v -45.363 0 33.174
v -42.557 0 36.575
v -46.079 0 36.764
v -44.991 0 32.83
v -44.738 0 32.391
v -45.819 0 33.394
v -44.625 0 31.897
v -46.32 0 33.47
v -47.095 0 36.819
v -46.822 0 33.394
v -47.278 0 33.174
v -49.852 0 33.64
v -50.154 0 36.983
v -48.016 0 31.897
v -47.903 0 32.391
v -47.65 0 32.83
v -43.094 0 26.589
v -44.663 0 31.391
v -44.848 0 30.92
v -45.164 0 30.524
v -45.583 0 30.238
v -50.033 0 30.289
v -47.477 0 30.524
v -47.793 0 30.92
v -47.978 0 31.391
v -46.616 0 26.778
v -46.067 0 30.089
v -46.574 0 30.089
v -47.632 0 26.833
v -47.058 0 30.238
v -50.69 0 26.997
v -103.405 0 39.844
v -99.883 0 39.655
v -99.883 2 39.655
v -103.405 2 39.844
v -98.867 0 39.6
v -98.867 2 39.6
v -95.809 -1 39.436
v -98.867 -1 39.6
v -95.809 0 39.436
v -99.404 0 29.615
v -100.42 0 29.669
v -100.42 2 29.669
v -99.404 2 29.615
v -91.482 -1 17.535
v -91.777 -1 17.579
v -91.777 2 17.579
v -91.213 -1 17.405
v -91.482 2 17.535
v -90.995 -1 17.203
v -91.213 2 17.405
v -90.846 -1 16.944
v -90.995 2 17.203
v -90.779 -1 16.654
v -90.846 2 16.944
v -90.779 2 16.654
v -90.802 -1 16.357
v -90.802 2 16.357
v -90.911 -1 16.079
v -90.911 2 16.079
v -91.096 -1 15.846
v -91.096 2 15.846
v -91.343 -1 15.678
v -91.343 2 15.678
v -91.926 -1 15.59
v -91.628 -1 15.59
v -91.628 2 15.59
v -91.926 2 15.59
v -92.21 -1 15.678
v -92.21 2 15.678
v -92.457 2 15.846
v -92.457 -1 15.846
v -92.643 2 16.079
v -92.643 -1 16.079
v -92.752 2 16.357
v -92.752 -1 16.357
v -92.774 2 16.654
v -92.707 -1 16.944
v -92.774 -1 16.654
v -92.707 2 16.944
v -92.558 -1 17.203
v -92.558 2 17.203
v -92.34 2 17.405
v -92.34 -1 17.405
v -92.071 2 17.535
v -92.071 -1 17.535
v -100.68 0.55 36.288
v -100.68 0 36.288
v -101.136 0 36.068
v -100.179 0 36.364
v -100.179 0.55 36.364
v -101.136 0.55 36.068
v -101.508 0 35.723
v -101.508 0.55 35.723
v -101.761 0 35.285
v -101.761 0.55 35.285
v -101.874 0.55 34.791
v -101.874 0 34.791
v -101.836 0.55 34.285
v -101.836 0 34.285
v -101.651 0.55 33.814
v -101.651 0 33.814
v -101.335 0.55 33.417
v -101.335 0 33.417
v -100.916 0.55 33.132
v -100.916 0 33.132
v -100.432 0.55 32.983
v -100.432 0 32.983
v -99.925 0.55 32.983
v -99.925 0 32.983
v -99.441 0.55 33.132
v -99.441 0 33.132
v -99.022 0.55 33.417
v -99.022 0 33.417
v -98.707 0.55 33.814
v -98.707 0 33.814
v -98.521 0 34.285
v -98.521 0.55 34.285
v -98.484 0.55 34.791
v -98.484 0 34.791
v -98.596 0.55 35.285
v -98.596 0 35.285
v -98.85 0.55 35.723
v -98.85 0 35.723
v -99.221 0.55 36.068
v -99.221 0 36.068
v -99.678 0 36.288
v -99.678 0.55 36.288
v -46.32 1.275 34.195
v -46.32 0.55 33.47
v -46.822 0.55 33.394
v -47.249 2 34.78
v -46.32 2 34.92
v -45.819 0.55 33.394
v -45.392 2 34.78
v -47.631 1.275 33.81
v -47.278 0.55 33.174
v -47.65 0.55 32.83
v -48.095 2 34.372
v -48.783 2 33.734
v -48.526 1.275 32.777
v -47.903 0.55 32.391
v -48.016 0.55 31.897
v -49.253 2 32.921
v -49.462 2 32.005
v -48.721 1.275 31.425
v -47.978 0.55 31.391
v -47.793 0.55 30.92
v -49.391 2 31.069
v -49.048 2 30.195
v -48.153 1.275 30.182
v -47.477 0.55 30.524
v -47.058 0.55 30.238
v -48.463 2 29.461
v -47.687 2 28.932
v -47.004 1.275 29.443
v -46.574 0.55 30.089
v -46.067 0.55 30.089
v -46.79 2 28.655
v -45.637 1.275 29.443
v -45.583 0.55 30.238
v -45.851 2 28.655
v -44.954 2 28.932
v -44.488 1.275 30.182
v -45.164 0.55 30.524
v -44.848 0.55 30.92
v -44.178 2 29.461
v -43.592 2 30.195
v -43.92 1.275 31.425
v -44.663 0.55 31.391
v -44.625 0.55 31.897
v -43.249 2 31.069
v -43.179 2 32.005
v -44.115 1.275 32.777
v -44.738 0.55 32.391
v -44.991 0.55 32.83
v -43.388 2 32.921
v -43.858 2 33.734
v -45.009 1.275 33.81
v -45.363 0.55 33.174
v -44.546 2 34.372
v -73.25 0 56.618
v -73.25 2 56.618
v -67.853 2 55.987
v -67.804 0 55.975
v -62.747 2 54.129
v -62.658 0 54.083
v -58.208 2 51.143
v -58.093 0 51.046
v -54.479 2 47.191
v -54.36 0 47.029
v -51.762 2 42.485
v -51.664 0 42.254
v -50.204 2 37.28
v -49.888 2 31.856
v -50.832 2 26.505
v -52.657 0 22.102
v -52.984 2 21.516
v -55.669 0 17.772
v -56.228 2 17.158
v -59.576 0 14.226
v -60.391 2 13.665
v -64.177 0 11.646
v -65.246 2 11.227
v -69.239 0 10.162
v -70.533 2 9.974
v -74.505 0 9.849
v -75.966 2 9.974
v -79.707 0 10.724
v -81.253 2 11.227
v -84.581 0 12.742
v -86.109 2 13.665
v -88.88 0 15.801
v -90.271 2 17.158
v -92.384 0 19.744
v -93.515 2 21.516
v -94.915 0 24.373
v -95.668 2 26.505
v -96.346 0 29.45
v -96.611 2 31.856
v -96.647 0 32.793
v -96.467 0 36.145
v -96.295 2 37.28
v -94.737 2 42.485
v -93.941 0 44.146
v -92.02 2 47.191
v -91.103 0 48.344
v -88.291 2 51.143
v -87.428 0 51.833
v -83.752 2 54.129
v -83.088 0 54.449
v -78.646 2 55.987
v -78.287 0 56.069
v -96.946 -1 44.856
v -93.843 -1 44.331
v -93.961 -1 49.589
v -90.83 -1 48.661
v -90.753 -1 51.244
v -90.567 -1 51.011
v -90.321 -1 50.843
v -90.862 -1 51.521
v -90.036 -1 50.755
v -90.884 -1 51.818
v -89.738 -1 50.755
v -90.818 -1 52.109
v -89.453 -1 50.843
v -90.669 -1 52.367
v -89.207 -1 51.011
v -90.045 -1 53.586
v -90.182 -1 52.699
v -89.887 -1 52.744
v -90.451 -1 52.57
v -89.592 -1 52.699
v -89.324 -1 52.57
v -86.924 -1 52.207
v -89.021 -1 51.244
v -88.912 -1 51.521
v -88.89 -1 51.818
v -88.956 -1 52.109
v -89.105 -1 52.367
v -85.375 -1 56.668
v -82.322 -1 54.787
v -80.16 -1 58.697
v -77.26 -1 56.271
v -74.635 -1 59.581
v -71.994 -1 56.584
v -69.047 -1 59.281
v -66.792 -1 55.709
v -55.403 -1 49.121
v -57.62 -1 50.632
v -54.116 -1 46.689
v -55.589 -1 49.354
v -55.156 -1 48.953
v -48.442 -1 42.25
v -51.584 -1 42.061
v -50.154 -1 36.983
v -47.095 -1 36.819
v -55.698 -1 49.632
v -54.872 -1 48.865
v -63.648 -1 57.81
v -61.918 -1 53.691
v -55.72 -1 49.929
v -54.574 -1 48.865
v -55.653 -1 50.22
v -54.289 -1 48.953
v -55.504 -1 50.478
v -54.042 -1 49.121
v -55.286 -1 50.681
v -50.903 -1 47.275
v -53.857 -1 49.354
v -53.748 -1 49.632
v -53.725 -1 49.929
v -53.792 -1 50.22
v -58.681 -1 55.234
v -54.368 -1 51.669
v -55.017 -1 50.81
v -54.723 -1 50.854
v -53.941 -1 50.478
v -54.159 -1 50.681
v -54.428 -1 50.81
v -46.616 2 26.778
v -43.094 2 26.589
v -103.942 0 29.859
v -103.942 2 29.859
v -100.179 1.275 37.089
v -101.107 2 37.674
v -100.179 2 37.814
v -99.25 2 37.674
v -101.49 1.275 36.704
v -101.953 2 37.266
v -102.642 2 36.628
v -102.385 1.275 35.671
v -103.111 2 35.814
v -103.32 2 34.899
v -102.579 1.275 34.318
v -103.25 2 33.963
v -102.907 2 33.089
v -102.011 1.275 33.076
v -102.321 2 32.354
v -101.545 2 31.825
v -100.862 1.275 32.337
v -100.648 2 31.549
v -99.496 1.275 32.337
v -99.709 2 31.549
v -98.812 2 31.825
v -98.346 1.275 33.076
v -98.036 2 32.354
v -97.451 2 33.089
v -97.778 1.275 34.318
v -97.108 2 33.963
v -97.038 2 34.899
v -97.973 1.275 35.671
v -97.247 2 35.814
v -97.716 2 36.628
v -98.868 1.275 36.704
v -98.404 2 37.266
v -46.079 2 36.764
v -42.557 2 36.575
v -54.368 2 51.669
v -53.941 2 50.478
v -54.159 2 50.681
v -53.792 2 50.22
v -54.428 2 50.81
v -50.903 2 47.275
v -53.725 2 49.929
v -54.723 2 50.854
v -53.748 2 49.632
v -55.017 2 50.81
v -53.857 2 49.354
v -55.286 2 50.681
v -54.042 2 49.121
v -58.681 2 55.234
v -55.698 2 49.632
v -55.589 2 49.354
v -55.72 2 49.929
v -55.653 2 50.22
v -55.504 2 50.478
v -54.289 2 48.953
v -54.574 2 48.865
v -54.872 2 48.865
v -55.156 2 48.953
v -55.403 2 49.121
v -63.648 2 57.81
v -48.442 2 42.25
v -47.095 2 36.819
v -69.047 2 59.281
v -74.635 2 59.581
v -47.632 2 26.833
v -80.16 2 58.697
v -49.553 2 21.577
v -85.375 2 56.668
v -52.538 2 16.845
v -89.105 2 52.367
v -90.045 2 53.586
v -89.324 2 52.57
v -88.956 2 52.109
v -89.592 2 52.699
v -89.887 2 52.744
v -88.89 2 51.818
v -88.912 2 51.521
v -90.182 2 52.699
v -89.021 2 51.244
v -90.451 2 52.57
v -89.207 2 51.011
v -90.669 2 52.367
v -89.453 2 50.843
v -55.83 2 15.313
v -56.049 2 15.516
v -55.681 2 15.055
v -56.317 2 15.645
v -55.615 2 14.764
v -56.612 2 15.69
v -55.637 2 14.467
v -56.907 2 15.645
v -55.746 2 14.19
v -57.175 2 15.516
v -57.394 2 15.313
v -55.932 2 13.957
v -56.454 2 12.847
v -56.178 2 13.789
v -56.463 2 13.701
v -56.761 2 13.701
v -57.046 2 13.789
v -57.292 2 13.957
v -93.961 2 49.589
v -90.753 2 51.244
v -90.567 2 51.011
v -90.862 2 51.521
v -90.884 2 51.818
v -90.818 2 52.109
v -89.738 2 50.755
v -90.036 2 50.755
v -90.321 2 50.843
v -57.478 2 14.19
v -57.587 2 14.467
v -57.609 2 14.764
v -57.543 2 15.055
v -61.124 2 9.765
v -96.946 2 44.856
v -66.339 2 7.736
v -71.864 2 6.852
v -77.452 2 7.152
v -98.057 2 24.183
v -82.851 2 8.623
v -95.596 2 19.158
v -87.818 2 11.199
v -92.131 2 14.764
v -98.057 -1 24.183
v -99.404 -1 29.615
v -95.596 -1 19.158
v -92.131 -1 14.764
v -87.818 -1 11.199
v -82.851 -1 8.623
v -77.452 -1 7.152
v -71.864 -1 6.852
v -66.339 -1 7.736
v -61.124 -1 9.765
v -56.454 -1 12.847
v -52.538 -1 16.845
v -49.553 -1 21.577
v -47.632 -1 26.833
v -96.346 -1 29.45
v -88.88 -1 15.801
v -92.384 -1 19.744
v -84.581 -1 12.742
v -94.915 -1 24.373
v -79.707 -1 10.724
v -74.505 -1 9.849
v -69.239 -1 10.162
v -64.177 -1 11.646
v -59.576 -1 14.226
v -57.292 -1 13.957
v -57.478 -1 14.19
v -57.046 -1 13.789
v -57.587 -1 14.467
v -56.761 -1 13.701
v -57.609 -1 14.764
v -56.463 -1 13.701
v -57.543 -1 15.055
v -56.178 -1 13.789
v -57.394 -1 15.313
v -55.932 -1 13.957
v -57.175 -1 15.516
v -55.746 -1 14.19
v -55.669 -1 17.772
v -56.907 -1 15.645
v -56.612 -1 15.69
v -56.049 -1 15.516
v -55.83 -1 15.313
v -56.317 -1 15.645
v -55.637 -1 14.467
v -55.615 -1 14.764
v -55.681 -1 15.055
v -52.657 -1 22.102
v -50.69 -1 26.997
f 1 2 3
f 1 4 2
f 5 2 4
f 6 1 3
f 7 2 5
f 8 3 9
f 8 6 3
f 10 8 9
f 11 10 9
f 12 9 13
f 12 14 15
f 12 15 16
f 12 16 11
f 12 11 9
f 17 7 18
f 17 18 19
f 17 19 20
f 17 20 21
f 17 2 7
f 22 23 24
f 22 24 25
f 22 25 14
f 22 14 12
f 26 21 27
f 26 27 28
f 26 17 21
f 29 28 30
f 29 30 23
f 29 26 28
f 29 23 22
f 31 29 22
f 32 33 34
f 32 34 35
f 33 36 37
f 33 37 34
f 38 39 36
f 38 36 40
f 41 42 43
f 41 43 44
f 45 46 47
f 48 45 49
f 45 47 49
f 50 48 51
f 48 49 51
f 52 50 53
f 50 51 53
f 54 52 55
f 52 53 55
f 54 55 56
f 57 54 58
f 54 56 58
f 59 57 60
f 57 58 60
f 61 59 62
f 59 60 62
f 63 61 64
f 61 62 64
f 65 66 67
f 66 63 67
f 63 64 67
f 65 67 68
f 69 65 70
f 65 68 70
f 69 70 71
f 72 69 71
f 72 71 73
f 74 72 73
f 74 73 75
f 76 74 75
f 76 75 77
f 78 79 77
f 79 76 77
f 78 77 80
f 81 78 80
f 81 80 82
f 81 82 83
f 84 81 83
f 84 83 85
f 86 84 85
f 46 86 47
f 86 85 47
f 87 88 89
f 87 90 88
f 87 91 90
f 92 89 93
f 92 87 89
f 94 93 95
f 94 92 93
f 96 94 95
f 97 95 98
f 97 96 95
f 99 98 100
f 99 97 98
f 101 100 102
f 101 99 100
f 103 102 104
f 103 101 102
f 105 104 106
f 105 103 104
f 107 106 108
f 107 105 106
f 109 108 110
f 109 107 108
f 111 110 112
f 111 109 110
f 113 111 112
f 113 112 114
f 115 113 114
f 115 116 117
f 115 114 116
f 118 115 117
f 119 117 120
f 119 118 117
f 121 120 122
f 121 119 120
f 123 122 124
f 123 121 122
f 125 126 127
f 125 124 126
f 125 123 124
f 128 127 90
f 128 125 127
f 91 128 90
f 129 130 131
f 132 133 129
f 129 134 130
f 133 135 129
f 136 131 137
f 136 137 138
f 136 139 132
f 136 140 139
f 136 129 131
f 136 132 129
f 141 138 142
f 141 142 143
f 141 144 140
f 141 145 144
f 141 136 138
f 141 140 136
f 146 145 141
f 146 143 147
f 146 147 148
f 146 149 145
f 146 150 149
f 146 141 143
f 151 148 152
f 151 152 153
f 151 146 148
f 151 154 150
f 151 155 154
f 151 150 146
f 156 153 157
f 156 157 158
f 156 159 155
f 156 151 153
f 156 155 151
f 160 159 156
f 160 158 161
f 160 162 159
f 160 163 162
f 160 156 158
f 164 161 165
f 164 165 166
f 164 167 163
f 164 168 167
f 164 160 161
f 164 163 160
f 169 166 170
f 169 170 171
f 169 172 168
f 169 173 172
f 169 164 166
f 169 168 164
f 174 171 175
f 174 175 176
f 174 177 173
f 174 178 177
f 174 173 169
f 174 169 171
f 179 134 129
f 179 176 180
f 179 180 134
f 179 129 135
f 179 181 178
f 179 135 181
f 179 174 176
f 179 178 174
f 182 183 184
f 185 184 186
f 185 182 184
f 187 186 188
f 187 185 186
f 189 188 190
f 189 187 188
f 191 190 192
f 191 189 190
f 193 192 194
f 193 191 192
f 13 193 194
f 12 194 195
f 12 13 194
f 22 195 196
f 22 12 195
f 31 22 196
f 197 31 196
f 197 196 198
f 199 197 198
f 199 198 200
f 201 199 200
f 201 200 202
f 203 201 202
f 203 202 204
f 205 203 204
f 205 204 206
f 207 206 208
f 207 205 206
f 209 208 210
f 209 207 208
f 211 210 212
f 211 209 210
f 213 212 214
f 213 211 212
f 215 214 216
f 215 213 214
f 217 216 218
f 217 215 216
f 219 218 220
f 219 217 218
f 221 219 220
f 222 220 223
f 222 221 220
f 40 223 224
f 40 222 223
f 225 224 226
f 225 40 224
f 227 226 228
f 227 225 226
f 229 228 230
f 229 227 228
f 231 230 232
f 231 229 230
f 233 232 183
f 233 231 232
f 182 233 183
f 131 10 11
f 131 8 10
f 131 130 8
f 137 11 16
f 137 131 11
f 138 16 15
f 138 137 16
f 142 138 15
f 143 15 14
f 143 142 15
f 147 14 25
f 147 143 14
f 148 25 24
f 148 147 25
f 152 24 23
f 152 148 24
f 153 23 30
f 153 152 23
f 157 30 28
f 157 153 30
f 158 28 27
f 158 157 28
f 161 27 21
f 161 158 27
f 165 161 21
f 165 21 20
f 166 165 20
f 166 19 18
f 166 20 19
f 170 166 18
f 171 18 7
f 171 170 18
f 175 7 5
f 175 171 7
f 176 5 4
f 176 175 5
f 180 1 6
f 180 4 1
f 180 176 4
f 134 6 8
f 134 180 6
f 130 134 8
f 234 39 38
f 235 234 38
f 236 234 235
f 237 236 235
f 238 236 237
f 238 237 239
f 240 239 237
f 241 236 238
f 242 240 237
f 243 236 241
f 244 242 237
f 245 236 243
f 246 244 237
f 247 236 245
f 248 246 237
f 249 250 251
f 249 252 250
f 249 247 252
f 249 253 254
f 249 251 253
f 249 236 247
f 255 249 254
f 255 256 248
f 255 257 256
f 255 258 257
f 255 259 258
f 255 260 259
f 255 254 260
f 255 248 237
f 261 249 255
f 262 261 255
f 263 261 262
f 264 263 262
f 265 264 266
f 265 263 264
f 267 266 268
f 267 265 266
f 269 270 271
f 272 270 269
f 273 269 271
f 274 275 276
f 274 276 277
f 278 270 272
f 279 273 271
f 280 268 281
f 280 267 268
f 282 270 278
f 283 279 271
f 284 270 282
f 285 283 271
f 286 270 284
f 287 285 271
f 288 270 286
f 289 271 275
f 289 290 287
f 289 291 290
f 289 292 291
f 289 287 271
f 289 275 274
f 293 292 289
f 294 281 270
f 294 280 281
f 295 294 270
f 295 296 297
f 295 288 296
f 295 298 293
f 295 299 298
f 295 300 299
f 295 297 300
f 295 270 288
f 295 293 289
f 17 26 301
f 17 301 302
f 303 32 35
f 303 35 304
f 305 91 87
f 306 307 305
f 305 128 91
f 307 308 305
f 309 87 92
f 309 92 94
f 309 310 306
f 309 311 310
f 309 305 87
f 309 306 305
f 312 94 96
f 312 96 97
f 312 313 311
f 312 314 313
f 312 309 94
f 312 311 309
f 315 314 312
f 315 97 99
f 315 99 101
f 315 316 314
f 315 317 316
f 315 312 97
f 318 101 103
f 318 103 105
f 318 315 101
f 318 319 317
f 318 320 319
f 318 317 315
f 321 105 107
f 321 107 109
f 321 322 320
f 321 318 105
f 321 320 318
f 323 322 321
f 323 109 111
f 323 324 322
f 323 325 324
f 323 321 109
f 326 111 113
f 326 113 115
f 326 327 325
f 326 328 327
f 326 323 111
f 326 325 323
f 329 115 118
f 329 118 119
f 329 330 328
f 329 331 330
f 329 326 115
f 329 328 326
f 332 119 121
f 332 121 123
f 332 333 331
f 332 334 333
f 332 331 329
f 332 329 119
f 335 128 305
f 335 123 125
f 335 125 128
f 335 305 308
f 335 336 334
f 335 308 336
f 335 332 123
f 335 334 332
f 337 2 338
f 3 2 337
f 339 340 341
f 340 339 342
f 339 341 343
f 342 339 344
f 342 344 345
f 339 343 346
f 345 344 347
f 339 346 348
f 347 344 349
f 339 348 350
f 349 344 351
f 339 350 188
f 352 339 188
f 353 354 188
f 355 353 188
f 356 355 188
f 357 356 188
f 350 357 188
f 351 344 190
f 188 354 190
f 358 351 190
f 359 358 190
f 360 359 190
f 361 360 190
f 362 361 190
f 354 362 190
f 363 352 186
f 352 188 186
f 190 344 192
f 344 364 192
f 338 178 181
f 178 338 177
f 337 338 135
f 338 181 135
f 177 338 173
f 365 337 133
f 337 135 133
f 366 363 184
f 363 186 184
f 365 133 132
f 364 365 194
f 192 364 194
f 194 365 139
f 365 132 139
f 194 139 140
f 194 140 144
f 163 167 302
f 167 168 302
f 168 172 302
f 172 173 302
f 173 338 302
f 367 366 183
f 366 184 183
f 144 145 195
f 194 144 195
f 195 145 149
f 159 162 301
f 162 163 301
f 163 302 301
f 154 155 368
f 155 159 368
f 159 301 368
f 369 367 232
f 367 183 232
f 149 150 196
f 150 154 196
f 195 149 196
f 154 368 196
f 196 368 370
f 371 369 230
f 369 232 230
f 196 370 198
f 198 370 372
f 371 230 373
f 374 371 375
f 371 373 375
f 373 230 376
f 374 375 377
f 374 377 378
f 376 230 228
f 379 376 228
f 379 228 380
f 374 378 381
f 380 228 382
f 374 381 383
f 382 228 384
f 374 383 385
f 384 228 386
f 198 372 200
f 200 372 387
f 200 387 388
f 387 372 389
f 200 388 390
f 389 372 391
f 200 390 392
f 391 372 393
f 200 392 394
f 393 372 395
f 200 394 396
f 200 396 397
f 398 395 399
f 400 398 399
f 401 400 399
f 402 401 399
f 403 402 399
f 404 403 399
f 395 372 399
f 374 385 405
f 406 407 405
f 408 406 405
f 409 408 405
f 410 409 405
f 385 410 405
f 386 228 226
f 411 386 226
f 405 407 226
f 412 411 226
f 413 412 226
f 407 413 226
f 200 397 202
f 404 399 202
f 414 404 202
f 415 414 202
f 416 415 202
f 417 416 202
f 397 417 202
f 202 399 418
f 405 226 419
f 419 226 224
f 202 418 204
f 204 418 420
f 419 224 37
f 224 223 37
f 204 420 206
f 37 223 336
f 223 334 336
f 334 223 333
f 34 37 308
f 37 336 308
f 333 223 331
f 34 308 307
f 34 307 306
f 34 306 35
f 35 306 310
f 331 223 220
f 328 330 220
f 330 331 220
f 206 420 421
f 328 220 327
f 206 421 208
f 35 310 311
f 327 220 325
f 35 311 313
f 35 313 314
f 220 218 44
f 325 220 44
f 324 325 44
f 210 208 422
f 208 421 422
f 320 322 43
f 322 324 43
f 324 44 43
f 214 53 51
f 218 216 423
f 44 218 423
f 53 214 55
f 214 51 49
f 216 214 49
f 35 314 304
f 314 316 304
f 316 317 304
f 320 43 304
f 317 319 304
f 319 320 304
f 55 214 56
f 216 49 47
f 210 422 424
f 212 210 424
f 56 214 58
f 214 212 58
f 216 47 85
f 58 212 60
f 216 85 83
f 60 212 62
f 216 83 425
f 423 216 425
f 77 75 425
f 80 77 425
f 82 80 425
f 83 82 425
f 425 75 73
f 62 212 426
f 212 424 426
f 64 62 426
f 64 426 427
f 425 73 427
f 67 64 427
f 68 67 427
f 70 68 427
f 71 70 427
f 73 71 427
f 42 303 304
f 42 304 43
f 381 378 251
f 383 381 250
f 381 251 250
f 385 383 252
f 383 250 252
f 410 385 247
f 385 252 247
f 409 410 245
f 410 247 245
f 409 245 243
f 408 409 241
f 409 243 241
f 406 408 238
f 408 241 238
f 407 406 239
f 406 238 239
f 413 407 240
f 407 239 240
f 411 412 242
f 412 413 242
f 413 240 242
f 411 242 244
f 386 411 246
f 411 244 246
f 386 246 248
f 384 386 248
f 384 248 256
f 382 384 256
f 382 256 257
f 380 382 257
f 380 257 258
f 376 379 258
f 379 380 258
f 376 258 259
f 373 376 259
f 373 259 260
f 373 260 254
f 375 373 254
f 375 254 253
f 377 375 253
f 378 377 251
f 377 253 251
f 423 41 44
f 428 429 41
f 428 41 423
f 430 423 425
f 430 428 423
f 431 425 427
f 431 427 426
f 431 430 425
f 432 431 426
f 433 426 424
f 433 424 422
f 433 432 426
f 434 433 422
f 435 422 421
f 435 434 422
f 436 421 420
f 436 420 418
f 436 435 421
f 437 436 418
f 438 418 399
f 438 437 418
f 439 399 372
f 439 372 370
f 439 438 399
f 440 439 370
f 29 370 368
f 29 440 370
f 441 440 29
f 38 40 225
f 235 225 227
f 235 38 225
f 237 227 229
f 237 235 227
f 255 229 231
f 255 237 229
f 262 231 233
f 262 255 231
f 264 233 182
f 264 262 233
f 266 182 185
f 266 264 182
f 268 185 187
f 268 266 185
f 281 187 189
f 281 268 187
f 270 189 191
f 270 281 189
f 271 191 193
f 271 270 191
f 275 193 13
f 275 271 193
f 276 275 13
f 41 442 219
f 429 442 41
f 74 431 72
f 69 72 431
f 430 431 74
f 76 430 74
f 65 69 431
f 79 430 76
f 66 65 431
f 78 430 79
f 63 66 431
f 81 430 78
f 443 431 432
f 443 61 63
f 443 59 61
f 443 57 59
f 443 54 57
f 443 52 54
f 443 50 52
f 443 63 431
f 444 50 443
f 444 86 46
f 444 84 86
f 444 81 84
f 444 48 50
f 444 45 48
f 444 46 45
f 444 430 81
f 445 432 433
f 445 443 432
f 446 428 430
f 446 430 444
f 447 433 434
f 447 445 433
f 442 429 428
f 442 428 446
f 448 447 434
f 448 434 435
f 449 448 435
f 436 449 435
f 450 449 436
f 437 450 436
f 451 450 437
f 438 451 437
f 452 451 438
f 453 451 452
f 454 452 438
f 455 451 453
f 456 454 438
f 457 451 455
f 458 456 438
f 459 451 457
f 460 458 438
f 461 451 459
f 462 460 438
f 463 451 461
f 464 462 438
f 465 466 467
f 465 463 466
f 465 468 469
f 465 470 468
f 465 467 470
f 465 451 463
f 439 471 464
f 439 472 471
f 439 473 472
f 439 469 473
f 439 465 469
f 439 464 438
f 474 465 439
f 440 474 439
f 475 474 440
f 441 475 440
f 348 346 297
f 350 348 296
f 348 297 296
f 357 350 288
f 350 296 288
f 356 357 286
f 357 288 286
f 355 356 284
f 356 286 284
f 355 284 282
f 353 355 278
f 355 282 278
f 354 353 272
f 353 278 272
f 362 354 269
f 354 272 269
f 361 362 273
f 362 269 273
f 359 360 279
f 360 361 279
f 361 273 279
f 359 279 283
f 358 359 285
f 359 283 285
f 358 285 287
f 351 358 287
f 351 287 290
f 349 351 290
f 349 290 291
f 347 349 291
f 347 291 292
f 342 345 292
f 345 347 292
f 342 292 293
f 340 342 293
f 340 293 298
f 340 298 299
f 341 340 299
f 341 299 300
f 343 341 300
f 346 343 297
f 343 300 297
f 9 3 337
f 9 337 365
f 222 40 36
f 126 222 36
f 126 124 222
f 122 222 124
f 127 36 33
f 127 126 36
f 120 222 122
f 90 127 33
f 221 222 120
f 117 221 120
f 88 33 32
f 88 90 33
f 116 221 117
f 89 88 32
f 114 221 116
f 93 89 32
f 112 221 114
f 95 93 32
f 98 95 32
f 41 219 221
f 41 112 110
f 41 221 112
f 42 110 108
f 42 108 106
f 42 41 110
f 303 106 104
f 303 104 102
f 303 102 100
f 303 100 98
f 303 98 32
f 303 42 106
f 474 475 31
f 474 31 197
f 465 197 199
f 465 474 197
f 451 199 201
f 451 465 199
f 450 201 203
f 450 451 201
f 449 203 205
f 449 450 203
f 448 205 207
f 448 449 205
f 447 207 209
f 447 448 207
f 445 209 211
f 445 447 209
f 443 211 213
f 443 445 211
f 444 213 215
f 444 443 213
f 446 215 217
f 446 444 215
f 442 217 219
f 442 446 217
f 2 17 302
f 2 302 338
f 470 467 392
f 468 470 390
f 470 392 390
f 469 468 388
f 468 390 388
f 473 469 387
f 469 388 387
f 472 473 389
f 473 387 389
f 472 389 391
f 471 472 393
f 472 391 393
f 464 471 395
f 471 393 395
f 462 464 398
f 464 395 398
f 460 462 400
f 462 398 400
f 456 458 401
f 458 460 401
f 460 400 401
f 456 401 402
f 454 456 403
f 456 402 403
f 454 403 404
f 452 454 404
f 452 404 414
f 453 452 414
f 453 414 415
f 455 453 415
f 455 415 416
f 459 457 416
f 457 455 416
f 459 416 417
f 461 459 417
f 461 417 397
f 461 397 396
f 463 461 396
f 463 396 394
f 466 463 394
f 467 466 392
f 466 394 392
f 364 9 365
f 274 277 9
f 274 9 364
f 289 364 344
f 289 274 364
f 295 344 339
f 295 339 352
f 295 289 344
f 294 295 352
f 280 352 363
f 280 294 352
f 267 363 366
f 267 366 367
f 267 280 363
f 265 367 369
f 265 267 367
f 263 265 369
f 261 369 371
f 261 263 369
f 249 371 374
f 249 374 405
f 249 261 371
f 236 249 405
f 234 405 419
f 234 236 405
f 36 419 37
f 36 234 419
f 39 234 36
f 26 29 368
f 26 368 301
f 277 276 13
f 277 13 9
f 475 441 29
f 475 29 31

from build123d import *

# Parameters (mm, degrees)
SKETCH1_R                                      = 23.401000001
BOSS_EXTRUDE1_DEPTH                            = 2
SKETCH2_R                                      = 1
CUT_EXTRUDE1_DEPTH                             = 10
BOSS_EXTRUDE3_START                            = 1
SKETCH6_R                                      = 1
BOSS_EXTRUDE3_DEPTH                            = 1
CSK_FOR_M3_FLAT_HEAD_MACHINE_SCREW1_AT_2_COUNT = 2
CSK_FOR_M3_FLAT_HEAD_MACHINE_SCREW1_AT_2_PITCH = 53.936


with BuildPart() as part:
    # Sketch1 → Boss-Extrude1 (new body)
    with BuildSketch(Plane(origin=(0, 0, 0), x_dir=(1, 0, 0), z_dir=(0, 1, 0))):
        with BuildLine():
            Line((-103.941978749, -29.858528223), (-100.420009087, -29.669294121))
            Line((-100.420009087, -29.669294121), (-99.403734393, -29.614690064))
            ThreePointArc((-99.403734393, -29.614690064), (-74.666073862, -6.853676168), (-47.63199035, -26.833013765))
            Line((-47.63199035, -26.833013765), (-46.615715656, -26.778409709))
            Line((-46.615715656, -26.778409709), (-43.093745994, -26.589175606))
            Line((-43.093745994, -26.589175606), (-42.55722364, -36.574772421))
            Line((-42.55722364, -36.574772421), (-46.079193302, -36.764006524))
            Line((-46.079193302, -36.764006524), (-47.095467996, -36.81861058))
            ThreePointArc((-47.095467996, -36.81861058), (-71.833128527, -59.579624476), (-98.867212039, -39.60028688))
            Line((-98.867212039, -39.60028688), (-99.883486733, -39.654890936))
            Line((-99.883486733, -39.654890936), (-103.405456395, -39.844125039))
            Line((-103.405456395, -39.844125039), (-103.941978749, -29.858528223))
        make_face()
        with Locations(Location((-73.249601195, -33.216650322, 0), (0, 0, 270))):
            Circle(SKETCH1_R, mode=Mode.SUBTRACT)
    extrude(amount=BOSS_EXTRUDE1_DEPTH)

    # Sketch2 → Cut-Extrude1 (cut)
    with BuildSketch(Plane(origin=(0, 2, 0), x_dir=(1, 0, 0), z_dir=(0, 1, 0))):
        with Locations(Location((-91.776597147, -16.579035648, 0), (0, 0, 270))):
            Circle(SKETCH2_R)
        with Locations(Location((-56.611986521, -14.68965437, 0), (0, 0, 270))):
            Circle(SKETCH2_R)
        with Locations(Location((-54.722605242, -49.854264996, 0), (0, 0, 270))):
            Circle(SKETCH2_R)
        with Locations(Location((-89.887215869, -51.743646275, 0), (0, 0, 270))):
            Circle(SKETCH2_R)
    extrude(amount=-CUT_EXTRUDE1_DEPTH, mode=Mode.SUBTRACT)

    # Sketch6 → Boss-Extrude3 (add)
    # profile 1 of 2: a face of its own
    with BuildSketch(Plane.XZ.offset(BOSS_EXTRUDE3_START)):
        with BuildLine():
            ThreePointArc((-47.095467996, 36.81861058), (-71.833128527, 59.579624476), (-98.867212039, 39.60028688))
            Line((-98.867212039, 39.60028688), (-95.809008422, 39.435970752))
            ThreePointArc((-95.809008422, 39.435970752), (-71.994085233, 56.583945432), (-50.153671613, 36.982926708))
            Line((-50.153671613, 36.982926708), (-47.095467996, 36.81861058))
        make_face()
        with Locations(Location((-89.887215869, 51.743646275, 0), (0, 0, 90))):
            Circle(SKETCH6_R, mode=Mode.SUBTRACT)
        with Locations(Location((-54.722605242, 49.854264996, 0), (0, 0, 90))):
            Circle(SKETCH6_R, mode=Mode.SUBTRACT)
    # profile 2 of 2: a face of its own
    with BuildSketch(Plane.XZ.offset(BOSS_EXTRUDE3_START)):
        with BuildLine():
            ThreePointArc((-50.690193967, 26.997329893), (-74.505117156, 9.849355213), (-96.345530776, 29.450373936))
            Line((-96.345530776, 29.450373936), (-99.403734393, 29.614690064))
            ThreePointArc((-99.403734393, 29.614690064), (-74.666073862, 6.853676168), (-47.63199035, 26.833013765))
            Line((-47.63199035, 26.833013765), (-50.690193967, 26.997329893))
        make_face()
        with Locations(Location((-91.776597147, 16.579035648, 0), (0, 0, 90))):
            Circle(SKETCH6_R, mode=Mode.SUBTRACT)
        with Locations(Location((-56.611986521, 14.68965437, 0), (0, 0, 90))):
            Circle(SKETCH6_R, mode=Mode.SUBTRACT)
    extrude(amount=-BOSS_EXTRUDE3_DEPTH)

    # Sketch9 → CSK for M3 Flat Head Machine Screw1 (revolve, cut)
    with BuildSketch(Plane(origin=(-100.178758687, 2, 34.663543807), x_dir=(0, 0, 1), z_dir=(1, 0, 0))):
        Polygon((0, 0), (0, 3.000025), (1.7, 3.000025), (1.7, 1.45), (3.15, 0), align=None)
    csk_for_m3_flat_head_machine_screw1 = revolve(axis=Axis((-100.178758687, 8.35, 34.663543807), (0, -1, 0)), mode=Mode.SUBTRACT)

    # CSK for M3 Flat Head Machine Screw1 at 2: CSK for M3 Flat Head Machine Screw1 ×2
    with Locations(*[Vector(0.9985596815585082, 0, -0.05365223542193572) * (i * CSK_FOR_M3_FLAT_HEAD_MACHINE_SCREW1_AT_2_PITCH) for i in range(1, CSK_FOR_M3_FLAT_HEAD_MACHINE_SCREW1_AT_2_COUNT)]):
        add(csk_for_m3_flat_head_machine_screw1, mode=Mode.SUBTRACT)


solid = part.part
